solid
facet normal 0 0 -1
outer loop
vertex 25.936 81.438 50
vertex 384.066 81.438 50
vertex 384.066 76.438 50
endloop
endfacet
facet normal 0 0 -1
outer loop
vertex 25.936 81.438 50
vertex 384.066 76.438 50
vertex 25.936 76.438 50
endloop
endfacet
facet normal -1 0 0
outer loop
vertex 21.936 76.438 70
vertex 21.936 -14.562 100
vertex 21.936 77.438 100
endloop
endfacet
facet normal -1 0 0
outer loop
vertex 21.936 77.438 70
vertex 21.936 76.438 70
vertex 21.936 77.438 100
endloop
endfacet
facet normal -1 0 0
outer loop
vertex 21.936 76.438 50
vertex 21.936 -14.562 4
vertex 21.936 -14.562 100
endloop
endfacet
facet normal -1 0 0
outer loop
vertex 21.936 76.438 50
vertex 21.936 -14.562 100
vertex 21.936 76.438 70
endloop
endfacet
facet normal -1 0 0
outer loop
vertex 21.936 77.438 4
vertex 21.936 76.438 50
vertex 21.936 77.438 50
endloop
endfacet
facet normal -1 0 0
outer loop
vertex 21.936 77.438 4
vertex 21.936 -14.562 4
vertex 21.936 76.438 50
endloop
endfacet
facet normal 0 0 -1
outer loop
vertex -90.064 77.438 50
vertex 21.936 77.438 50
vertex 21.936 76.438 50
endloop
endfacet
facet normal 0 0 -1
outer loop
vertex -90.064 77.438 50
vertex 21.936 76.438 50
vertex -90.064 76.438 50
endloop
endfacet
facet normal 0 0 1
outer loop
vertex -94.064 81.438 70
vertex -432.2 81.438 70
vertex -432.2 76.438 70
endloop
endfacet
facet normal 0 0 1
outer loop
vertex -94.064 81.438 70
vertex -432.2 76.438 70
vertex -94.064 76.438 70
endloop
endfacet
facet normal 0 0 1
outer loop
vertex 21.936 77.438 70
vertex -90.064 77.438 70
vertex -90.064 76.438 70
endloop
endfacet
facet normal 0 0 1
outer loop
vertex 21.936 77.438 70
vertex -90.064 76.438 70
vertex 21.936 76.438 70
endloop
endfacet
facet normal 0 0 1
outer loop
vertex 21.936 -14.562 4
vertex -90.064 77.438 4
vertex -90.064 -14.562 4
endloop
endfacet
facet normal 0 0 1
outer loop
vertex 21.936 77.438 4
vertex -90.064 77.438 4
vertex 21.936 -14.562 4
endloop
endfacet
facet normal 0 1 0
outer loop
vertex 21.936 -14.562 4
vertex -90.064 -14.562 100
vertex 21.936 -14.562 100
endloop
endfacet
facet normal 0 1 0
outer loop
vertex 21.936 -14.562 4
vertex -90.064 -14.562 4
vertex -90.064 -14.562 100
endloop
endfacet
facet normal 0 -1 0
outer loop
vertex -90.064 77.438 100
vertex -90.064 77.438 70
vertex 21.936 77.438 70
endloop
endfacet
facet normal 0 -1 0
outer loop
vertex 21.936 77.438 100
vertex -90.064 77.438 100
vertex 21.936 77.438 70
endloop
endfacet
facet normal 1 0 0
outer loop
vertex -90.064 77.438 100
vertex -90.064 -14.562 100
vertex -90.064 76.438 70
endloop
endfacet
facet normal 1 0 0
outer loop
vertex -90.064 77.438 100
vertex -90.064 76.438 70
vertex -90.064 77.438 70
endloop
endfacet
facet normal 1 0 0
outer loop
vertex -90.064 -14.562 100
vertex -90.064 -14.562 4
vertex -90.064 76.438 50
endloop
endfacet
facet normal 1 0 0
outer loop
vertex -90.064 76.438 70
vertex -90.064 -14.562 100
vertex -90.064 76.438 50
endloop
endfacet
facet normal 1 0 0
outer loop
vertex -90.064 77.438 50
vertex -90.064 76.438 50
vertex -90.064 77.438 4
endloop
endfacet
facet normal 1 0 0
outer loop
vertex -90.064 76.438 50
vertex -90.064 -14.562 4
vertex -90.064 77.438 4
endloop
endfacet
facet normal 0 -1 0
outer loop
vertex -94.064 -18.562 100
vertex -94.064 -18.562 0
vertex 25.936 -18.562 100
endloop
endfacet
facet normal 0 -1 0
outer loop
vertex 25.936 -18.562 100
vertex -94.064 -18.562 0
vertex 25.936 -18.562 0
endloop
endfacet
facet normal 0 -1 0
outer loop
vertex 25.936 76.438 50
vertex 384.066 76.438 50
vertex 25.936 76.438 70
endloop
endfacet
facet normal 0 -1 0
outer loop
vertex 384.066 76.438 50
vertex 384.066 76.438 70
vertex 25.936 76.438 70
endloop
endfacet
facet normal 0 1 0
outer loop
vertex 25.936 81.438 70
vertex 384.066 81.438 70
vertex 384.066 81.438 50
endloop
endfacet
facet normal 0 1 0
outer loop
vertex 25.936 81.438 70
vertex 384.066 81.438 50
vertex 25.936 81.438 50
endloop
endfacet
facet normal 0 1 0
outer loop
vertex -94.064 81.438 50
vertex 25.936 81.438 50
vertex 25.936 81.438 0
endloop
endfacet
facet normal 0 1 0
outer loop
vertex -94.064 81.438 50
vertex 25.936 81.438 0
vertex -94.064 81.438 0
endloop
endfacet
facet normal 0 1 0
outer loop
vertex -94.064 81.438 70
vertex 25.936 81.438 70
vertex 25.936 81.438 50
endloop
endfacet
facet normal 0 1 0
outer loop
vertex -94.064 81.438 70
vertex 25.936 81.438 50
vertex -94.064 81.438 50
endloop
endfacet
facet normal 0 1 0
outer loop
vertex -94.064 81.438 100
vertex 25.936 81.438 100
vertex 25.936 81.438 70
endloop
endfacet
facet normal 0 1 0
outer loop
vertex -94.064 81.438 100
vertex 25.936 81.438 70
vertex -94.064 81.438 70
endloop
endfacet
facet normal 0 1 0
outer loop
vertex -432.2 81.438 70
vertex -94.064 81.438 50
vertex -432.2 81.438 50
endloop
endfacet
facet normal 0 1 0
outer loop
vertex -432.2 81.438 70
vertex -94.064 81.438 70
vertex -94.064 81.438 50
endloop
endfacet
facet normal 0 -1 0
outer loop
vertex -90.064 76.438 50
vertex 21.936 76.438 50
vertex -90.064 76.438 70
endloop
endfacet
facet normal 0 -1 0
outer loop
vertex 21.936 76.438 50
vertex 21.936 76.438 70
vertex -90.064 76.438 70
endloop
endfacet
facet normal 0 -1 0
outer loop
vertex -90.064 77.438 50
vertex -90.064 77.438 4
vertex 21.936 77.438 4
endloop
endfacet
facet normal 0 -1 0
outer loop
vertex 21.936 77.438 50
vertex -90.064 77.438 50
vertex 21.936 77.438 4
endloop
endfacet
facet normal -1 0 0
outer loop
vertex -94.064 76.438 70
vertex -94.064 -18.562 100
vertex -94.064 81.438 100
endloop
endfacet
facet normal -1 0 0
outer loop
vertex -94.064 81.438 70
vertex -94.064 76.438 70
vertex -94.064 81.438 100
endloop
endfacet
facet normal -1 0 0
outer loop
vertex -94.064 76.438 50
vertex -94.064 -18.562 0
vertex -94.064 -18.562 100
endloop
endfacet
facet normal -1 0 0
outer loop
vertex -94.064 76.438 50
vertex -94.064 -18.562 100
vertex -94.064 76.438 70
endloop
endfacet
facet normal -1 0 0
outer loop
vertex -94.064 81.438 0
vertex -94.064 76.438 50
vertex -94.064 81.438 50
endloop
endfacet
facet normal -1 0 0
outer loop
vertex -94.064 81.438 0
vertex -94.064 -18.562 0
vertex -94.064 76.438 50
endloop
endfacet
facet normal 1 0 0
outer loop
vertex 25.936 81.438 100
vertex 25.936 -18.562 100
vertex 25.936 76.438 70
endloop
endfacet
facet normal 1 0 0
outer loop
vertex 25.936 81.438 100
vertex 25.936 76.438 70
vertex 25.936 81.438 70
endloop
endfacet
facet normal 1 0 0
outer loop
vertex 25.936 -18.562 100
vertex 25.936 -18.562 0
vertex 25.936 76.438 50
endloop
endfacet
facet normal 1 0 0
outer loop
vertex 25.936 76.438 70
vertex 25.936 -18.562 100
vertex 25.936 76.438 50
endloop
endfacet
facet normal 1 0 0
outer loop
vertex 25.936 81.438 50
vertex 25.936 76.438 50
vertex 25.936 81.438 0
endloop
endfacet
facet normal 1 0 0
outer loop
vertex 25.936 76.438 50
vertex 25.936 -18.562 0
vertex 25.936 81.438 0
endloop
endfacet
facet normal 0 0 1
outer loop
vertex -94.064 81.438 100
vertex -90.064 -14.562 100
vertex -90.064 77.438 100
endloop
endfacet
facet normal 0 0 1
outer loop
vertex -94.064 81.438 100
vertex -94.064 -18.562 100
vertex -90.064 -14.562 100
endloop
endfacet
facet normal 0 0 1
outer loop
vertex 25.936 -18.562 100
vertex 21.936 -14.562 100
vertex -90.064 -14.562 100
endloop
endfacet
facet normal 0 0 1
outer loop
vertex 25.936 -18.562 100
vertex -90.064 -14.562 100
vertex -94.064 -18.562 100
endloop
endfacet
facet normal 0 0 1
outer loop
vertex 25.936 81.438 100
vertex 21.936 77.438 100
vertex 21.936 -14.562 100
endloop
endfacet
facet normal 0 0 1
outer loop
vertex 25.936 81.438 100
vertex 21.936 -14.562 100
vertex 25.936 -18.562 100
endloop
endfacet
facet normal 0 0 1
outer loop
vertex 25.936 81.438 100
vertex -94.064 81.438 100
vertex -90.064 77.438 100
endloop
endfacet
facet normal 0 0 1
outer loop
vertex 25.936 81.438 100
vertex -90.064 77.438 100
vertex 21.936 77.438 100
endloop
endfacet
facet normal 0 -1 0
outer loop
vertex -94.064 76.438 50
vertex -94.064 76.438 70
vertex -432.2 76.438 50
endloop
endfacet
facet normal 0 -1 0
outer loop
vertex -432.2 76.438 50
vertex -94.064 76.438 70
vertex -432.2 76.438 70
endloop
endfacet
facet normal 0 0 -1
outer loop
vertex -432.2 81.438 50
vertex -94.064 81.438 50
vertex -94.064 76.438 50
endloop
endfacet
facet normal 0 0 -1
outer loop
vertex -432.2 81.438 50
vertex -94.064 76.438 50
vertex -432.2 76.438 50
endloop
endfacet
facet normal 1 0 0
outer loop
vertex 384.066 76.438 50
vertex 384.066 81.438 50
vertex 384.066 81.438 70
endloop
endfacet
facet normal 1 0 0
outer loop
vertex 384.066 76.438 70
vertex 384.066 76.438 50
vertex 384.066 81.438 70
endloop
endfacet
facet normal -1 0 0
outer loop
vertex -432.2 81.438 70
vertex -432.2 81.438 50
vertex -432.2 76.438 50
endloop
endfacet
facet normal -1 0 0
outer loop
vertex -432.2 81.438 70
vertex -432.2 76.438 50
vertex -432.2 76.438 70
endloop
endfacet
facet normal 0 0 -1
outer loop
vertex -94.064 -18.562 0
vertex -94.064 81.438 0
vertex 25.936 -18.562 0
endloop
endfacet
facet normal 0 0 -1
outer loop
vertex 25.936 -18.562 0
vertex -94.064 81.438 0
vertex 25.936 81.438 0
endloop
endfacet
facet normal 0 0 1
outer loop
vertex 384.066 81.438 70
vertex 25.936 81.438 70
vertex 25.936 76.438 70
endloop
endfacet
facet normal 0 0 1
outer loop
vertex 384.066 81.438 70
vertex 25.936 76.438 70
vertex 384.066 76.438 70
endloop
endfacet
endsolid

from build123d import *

# Parameters (mm, degrees)
F0_W     = 120
F0_H     = 100
F1_DEPTH = 100
F2_T     = -4
F3_W     = 338.13595726
F3_H     = 20
F3_W_2   = 120
F3_W_3   = 358.1296569666
F4_DEPTH = 5


with BuildPart() as f1:
    # F0 (on Top) → F1 (new body)
    with BuildSketch(Plane.XY):
        with Locations((-34.0641250794, 31.4384140074)):
            Rectangle(F0_W, F0_H)
    extrude(amount=F1_DEPTH)

    # F2
    f2_openings = [f1.faces().sort_by_distance(p)[0] for p in [
        (-34.064125, 31.438414, 100),
    ]]
    offset(amount=F2_T, openings=f2_openings)

    # F3 (on face) → F4 (join)
    with BuildSketch(Plane(origin=(0, 81.4384140074, 0), x_dir=(-1, 0, 0), z_dir=(0, 1, 0))):
        with Locations((263.1321037094, 60)):
            Rectangle(F3_W, F3_H)
        with Locations((34.0641250794, 60)):
            Rectangle(F3_W_2, F3_H)
        with Locations((-205.0007034039, 60)):
            Rectangle(F3_W_3, F3_H)
    extrude(amount=-F4_DEPTH)


solid = f1.part
